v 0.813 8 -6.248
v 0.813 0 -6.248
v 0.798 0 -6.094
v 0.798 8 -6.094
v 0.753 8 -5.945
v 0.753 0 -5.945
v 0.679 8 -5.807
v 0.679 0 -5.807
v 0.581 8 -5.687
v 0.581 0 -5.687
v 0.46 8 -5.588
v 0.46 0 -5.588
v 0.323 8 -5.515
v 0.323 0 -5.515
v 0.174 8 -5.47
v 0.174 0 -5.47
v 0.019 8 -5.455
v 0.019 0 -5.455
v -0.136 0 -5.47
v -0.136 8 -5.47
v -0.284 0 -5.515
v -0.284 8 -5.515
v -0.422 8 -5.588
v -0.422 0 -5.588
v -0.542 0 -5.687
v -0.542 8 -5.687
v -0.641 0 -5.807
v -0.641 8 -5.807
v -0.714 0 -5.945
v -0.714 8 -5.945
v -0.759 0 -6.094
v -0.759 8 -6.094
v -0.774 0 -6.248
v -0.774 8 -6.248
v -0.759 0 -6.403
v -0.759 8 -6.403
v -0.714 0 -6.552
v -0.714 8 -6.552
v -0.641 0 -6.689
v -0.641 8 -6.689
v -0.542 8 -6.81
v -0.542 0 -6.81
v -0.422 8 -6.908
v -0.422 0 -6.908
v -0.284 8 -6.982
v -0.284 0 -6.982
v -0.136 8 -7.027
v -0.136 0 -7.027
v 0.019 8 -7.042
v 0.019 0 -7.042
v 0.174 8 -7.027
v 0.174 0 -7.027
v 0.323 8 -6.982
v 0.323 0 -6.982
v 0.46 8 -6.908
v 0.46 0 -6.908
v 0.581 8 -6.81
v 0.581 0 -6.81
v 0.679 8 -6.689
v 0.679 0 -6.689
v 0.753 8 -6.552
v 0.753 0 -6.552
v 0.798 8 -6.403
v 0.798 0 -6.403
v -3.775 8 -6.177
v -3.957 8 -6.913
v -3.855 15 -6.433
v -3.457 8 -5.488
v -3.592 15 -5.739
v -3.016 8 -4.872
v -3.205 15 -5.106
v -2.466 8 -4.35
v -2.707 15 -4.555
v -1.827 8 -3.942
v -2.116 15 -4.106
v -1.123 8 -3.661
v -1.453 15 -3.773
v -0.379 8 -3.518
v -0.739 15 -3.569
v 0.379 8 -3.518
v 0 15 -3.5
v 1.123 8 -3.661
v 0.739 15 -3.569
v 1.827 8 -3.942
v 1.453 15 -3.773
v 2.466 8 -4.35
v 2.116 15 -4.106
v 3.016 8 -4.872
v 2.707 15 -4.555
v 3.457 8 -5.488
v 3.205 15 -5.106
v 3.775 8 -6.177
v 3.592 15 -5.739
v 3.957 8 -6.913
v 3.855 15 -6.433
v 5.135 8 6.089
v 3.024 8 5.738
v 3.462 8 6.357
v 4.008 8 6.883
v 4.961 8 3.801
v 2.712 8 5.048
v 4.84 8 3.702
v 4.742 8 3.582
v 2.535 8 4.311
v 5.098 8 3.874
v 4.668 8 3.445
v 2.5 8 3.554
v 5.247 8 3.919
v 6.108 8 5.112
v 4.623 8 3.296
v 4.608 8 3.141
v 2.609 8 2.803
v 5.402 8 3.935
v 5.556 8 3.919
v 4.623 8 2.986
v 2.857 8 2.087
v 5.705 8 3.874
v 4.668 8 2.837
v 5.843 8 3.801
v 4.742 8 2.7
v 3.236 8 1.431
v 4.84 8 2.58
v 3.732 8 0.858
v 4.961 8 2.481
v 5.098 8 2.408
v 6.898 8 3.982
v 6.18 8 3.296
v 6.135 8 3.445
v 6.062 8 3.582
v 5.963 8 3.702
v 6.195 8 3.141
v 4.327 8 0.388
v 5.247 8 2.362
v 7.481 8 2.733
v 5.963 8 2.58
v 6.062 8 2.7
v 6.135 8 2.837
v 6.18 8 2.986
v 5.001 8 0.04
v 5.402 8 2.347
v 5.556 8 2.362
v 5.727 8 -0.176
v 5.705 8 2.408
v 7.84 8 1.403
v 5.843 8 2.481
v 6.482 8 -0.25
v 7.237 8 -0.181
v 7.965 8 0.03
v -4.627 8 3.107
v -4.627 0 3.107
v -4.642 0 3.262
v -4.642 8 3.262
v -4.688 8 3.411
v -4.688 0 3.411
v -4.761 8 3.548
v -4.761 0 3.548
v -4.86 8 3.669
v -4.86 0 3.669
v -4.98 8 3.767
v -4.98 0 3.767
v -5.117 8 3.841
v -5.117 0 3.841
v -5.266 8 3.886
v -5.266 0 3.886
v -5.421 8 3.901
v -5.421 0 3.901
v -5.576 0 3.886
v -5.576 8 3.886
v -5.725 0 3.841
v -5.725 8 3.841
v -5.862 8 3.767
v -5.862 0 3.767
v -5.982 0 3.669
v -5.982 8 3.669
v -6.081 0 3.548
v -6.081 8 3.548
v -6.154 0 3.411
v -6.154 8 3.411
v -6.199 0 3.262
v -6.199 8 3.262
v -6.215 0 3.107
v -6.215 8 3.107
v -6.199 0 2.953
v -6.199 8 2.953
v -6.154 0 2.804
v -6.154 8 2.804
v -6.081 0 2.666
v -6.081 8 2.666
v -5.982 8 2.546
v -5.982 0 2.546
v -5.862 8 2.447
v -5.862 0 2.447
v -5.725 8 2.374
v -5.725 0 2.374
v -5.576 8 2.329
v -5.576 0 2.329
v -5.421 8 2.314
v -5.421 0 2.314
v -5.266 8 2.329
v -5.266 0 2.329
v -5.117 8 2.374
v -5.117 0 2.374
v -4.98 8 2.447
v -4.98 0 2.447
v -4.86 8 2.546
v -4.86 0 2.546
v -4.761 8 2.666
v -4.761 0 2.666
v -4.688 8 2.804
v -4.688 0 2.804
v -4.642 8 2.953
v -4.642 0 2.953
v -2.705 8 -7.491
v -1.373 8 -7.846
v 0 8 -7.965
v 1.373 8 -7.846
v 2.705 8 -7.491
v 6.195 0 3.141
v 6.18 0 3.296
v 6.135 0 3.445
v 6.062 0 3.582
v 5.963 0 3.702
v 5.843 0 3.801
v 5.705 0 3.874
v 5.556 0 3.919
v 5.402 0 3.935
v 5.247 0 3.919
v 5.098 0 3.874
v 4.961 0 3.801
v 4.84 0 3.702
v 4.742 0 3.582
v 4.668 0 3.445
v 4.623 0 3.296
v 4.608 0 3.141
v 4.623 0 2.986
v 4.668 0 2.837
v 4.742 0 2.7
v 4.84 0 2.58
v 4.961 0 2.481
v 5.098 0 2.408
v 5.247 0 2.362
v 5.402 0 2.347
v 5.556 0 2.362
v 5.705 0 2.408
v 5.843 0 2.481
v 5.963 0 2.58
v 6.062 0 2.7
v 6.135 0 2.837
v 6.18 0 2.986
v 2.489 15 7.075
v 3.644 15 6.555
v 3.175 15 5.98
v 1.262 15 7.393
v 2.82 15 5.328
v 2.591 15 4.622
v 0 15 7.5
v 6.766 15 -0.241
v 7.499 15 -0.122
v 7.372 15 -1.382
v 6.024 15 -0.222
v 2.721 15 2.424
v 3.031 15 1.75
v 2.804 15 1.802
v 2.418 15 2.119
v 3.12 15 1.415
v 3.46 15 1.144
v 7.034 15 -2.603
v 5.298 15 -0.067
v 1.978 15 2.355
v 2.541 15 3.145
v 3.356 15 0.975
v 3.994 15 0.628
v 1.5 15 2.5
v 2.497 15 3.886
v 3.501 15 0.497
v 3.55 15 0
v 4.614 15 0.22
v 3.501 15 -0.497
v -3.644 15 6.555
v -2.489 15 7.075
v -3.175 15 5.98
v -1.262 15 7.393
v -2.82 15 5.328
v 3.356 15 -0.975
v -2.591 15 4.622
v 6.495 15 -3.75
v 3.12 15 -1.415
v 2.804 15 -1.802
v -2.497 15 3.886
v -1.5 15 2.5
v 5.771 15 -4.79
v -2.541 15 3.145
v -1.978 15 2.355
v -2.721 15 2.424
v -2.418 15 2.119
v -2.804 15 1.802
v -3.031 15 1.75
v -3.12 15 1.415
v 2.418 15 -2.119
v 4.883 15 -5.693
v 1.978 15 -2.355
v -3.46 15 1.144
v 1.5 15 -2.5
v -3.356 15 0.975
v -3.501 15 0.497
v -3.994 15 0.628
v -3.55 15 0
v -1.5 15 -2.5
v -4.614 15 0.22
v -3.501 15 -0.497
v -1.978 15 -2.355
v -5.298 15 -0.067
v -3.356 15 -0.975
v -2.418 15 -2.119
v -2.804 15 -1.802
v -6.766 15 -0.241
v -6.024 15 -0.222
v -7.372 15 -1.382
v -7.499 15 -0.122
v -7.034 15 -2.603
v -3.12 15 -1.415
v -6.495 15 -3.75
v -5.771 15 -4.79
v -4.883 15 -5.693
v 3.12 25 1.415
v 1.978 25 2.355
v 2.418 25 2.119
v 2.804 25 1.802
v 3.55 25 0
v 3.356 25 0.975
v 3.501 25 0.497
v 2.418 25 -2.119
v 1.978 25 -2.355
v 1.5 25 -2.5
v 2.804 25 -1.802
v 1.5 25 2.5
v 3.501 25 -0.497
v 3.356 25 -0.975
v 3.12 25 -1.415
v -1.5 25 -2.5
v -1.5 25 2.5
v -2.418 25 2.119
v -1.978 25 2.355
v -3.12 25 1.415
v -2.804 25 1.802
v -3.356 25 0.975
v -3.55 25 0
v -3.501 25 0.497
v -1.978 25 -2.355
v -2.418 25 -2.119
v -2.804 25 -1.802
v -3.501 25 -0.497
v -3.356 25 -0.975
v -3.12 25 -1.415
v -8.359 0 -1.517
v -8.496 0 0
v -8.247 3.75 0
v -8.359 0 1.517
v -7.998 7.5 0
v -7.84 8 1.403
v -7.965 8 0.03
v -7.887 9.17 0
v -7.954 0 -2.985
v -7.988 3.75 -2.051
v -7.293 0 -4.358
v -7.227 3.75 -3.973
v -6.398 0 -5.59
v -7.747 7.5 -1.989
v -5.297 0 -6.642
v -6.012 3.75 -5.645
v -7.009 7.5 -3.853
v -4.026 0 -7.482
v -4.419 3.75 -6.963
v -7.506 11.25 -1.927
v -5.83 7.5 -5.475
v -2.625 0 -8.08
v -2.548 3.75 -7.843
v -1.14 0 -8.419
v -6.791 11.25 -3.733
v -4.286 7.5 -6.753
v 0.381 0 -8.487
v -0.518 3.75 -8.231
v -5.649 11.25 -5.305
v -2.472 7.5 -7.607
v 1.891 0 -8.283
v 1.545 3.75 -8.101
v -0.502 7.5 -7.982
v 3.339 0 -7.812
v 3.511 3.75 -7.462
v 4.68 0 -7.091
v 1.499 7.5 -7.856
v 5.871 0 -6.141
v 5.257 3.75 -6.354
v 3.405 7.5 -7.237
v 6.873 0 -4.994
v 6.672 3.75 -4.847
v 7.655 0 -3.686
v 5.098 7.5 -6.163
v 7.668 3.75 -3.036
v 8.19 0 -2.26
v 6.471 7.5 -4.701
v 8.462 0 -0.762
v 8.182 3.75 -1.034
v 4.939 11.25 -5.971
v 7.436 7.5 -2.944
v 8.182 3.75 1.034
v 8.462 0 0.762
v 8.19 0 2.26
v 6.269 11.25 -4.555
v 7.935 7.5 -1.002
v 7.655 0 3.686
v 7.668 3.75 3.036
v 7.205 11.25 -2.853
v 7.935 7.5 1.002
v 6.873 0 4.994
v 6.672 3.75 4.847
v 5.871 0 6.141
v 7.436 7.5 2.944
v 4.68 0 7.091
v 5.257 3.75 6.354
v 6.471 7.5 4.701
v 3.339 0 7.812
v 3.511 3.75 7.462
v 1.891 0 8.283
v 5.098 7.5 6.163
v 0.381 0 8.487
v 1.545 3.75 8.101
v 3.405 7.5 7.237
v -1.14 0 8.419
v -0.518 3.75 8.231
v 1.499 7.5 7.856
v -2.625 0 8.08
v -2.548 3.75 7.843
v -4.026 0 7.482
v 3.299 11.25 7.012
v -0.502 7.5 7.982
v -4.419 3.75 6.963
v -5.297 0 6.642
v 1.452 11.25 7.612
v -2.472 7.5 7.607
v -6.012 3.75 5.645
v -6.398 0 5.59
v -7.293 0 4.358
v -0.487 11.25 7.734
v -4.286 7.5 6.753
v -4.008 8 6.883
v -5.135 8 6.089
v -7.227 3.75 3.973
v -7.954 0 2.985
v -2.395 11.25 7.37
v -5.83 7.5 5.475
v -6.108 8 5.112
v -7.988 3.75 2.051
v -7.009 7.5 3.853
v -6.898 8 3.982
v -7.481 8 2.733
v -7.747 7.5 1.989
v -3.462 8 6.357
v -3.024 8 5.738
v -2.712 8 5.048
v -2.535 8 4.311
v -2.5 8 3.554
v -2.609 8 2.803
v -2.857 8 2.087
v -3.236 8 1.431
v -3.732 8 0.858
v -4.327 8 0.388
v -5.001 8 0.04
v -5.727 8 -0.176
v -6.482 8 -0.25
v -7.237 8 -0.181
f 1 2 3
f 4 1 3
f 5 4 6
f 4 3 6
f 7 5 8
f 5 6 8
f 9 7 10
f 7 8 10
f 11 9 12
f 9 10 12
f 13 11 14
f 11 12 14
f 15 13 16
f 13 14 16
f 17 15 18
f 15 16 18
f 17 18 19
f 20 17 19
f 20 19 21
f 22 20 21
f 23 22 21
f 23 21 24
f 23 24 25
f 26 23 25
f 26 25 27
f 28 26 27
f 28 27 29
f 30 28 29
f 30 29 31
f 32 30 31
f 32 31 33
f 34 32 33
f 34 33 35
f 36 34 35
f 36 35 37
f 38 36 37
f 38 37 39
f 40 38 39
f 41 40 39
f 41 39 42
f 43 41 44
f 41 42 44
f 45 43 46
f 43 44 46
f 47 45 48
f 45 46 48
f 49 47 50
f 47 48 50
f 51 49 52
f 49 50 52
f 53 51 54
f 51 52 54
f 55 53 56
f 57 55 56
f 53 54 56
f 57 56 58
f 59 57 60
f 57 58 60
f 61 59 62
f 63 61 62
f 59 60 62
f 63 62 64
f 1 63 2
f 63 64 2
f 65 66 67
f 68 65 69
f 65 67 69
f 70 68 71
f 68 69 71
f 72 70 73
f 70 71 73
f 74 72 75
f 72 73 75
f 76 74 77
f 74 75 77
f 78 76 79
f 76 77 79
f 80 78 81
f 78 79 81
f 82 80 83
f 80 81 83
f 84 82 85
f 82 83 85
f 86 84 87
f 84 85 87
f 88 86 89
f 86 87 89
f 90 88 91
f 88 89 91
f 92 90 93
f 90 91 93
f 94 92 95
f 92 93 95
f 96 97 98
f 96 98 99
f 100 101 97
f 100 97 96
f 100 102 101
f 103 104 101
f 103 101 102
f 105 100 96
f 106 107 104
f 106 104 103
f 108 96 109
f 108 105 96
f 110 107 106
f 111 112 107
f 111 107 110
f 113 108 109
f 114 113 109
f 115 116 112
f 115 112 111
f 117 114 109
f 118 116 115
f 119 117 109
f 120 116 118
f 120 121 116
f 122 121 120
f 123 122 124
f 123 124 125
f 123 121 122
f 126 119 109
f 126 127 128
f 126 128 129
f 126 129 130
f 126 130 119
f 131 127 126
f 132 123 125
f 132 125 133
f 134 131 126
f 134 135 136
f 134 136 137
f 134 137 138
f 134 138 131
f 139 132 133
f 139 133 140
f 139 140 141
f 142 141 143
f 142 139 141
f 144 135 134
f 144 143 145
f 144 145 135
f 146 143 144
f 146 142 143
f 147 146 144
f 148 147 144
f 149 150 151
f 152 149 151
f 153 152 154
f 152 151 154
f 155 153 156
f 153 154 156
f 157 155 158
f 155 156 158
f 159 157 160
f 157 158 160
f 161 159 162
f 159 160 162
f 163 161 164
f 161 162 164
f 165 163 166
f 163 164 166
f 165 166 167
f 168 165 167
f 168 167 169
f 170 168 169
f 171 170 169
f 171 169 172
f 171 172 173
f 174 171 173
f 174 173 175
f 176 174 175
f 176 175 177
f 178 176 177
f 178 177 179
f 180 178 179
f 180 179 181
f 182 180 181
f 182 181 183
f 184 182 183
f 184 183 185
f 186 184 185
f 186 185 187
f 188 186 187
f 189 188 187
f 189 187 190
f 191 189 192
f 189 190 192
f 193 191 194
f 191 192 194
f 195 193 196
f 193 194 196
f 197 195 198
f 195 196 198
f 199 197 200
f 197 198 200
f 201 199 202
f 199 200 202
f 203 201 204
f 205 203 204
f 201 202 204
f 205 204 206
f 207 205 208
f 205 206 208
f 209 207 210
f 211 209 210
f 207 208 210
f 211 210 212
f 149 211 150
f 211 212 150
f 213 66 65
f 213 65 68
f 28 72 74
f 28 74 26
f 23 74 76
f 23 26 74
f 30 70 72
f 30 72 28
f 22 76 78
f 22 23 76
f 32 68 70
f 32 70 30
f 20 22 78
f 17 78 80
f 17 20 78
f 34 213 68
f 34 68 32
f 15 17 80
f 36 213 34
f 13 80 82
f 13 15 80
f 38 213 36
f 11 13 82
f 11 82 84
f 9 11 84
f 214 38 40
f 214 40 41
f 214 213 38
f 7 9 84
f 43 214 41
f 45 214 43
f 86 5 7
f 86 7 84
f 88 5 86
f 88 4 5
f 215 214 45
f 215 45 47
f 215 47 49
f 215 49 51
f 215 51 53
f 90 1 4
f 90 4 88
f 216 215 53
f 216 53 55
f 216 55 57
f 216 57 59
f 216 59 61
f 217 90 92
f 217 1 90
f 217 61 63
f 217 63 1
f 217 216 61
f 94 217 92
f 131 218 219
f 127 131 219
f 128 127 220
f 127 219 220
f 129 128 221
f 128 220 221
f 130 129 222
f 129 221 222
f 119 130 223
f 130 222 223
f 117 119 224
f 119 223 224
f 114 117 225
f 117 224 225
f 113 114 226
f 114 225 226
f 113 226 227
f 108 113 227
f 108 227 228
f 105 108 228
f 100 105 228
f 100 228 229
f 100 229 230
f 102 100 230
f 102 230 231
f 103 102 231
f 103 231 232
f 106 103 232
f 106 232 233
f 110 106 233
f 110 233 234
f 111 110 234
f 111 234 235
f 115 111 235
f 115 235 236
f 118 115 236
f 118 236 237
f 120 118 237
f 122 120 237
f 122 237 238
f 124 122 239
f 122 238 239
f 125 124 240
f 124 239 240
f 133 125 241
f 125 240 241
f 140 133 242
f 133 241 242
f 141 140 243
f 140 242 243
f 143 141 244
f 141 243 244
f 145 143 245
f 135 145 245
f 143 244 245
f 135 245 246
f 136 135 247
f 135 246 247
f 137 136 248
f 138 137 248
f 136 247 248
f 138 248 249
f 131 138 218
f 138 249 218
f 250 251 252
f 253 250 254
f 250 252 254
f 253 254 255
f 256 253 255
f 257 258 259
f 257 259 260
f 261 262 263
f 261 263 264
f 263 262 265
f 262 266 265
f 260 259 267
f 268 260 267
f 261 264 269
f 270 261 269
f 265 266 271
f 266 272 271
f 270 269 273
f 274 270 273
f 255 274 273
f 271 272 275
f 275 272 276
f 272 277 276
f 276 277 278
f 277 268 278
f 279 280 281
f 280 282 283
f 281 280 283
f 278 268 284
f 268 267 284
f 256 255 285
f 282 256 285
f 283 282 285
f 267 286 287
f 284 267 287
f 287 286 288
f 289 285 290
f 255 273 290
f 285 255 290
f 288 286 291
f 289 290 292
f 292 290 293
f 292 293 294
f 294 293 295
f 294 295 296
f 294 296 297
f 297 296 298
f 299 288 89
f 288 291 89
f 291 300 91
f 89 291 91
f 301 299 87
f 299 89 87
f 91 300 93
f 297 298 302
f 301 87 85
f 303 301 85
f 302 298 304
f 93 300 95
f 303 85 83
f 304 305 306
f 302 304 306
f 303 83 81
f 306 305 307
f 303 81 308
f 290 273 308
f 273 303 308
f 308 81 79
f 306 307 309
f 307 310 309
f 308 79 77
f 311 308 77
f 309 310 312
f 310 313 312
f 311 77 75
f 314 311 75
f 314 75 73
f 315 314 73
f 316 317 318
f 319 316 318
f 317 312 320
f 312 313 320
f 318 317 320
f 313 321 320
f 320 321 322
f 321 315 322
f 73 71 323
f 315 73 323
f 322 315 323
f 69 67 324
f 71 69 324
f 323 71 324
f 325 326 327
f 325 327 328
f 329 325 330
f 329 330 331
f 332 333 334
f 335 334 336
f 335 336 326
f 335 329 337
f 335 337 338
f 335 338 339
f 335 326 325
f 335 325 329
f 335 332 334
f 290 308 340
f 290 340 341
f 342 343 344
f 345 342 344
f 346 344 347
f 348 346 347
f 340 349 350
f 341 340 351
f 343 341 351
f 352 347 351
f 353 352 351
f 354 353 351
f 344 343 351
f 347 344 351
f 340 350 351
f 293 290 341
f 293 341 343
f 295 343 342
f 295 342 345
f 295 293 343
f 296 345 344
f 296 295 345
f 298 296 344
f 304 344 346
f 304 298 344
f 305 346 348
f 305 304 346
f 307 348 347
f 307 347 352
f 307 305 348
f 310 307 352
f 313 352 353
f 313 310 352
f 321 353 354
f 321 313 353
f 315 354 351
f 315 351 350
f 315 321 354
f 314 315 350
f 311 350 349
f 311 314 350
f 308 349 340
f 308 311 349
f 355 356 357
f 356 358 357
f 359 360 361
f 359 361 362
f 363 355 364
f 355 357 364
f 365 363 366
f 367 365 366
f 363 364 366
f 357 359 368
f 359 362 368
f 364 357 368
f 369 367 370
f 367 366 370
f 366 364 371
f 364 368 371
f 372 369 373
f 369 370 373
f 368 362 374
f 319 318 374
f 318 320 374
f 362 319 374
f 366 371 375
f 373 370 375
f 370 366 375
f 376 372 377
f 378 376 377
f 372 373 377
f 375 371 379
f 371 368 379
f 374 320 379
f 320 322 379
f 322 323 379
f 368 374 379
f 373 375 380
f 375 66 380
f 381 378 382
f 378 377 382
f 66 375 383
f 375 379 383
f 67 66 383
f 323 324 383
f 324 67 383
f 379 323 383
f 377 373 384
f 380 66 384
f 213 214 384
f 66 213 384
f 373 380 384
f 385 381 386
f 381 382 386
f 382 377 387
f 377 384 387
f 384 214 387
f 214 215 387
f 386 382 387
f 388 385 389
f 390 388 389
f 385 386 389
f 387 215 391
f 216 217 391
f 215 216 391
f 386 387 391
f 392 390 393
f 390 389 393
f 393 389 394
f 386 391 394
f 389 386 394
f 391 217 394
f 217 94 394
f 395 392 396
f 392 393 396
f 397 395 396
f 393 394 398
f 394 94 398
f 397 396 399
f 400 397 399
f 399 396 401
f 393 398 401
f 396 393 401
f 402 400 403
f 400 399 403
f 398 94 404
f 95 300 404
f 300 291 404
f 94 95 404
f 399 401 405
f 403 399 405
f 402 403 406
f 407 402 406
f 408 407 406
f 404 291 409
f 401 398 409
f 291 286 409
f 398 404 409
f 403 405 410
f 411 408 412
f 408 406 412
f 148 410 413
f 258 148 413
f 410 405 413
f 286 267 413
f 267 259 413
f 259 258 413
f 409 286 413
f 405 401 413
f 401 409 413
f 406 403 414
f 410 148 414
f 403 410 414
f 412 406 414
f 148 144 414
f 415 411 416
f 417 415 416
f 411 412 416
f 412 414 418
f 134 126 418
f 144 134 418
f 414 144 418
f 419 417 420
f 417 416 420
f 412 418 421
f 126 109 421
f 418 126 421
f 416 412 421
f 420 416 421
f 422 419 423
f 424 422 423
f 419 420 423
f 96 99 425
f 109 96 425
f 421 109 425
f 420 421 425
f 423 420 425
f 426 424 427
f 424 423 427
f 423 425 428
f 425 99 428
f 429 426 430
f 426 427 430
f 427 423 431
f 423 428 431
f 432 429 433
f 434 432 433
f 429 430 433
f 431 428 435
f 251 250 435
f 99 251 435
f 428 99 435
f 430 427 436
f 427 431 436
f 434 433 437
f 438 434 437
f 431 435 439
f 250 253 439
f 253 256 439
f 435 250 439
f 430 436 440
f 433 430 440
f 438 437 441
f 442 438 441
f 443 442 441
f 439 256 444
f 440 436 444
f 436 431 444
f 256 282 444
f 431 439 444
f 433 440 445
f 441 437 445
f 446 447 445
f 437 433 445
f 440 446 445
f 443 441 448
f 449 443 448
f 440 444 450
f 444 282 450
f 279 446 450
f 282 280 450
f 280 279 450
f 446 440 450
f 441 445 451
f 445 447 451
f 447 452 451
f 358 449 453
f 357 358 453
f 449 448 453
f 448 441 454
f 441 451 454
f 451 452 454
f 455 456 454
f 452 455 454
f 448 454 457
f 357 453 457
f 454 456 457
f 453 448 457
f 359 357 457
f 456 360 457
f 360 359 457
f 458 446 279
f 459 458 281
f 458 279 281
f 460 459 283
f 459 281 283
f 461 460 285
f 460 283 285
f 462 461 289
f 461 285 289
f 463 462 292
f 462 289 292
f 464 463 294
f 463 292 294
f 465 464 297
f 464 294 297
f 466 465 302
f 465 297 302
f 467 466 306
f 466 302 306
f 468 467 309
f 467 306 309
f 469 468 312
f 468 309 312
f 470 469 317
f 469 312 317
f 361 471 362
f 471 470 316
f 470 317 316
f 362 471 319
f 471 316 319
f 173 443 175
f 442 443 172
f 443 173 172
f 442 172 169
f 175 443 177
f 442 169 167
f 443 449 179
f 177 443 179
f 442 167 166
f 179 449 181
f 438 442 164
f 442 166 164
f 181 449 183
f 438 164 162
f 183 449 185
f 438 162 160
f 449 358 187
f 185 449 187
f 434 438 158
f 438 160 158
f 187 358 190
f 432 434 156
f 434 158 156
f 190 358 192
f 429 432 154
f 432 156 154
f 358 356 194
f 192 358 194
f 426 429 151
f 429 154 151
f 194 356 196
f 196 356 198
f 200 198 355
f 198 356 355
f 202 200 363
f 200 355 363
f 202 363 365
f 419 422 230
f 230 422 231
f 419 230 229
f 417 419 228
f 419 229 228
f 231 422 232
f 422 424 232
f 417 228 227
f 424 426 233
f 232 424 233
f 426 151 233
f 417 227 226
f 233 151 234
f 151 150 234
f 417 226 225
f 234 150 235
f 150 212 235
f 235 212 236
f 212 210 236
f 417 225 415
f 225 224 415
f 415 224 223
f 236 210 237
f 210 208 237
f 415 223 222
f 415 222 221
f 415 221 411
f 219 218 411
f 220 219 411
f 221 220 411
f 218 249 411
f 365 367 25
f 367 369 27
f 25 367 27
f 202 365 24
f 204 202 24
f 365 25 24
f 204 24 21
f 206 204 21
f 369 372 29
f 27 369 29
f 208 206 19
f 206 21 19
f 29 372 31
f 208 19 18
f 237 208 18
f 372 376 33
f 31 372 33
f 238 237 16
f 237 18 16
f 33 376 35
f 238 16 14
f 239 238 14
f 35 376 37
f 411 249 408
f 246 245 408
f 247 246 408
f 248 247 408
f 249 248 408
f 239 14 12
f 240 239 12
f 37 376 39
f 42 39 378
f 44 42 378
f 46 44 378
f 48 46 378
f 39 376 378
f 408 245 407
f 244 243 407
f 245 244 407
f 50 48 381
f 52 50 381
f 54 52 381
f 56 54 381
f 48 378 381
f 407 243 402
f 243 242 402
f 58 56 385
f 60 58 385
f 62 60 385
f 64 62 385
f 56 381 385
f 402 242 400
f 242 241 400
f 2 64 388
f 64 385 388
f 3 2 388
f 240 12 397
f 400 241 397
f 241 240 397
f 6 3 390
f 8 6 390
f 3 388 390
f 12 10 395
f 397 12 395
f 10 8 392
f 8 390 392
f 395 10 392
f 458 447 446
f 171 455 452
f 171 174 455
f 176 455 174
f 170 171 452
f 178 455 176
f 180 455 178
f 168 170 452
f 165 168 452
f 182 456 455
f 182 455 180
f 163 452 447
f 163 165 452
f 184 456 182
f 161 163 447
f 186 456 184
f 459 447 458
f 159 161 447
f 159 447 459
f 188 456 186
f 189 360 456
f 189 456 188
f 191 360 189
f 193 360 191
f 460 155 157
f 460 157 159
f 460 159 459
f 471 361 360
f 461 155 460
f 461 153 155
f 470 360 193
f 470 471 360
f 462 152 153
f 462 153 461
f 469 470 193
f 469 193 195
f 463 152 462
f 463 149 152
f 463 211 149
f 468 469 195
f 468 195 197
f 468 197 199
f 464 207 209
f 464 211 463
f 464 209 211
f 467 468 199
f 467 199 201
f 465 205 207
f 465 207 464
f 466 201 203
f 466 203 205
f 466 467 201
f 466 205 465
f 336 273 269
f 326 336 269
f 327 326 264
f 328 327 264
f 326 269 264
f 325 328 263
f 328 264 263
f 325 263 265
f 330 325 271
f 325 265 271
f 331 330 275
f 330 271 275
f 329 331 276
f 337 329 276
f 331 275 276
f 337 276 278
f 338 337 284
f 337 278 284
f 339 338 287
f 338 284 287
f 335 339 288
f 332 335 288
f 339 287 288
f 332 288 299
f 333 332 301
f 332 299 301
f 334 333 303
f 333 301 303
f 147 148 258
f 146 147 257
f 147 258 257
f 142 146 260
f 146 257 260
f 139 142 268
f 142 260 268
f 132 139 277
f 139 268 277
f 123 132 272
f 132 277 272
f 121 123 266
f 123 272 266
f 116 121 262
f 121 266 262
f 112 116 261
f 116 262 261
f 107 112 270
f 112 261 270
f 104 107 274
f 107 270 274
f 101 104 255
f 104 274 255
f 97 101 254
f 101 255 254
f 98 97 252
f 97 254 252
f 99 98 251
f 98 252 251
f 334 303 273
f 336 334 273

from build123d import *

# Parameters (mm, degrees)
CUT_EXTRUDE4_REACH  = 21.219
SKETCH5_R           = 0.79375
SKETCH4_R           = 4
CUT_EXTRUDE3_DEPTH  = 7
BOSS_EXTRUDE1_DEPTH = 10


with BuildPart() as part:
    # Sketch1 → Revolve1 (revolve)
    with BuildSketch(Plane.XY, mode=Mode.PRIVATE) as revolve1_sk:
        Polygon((0, 0), (8.496, 0), (7.5, 15), (3.5, 15), (0, 15), align=None)
    revolve(revolve1_sk.sketch.rotate(Axis((0, 15, 0), (0, -1, 0)), 180), axis=Axis((0, 15, 0), (0, -1, 0)))

    # Sketch5 → Cut-Extrude4 (cut, up to next)
    with BuildSketch(Plane.XZ, mode=Mode.PRIVATE) as cut_extrude4_sk1:
        with Locations((5.401571729, 3.140943396)):
            Circle(SKETCH5_R)
    cut_extrude4_tool1 = extrude(cut_extrude4_sk1.sketch, amount=-CUT_EXTRUDE4_REACH, mode=Mode.PRIVATE) & part.part
    # Sketch5 → Cut-Extrude4 (cut, up to next)
    with BuildSketch(Plane.XZ, mode=Mode.PRIVATE) as cut_extrude4_sk2:
        with Locations((0.019350908, -6.248370036)):
            Circle(SKETCH5_R)
    cut_extrude4_tool2 = extrude(cut_extrude4_sk2.sketch, amount=-CUT_EXTRUDE4_REACH, mode=Mode.PRIVATE) & part.part
    # Sketch5 → Cut-Extrude4 (cut, up to next)
    with BuildSketch(Plane.XZ, mode=Mode.PRIVATE) as cut_extrude4_sk3:
        with Locations((-5.420922637, 3.10742664)):
            Circle(SKETCH5_R)
    cut_extrude4_tool3 = extrude(cut_extrude4_sk3.sketch, amount=-CUT_EXTRUDE4_REACH, mode=Mode.PRIVATE) & part.part
    add(cut_extrude4_tool1.solids().sort_by_distance((5.401572, 0, 3.140943))[0], mode=Mode.SUBTRACT)
    add(cut_extrude4_tool2.solids().sort_by_distance((0.019351, 0, -6.24837))[0], mode=Mode.SUBTRACT)
    add(cut_extrude4_tool3.solids().sort_by_distance((-5.420923, 0, 3.107427))[0], mode=Mode.SUBTRACT)

    # Sketch4 → Cut-Extrude3 (cut)
    with BuildSketch(Plane(origin=(0, 15, 0), x_dir=(1, 0, 0), z_dir=(0, 1, 0))):
        with Locations((0, 7.5)):
            Circle(SKETCH4_R)
        with Locations((6.495190528, -3.75)):
            Circle(SKETCH4_R)
        with Locations((-6.495190528, -3.75)):
            Circle(SKETCH4_R)
    extrude(amount=-CUT_EXTRUDE3_DEPTH, mode=Mode.SUBTRACT)

    # Sketch8 → Boss-Extrude1 (add)
    with BuildSketch(Plane(origin=(0, 15, 0), x_dir=(1, 0, 0), z_dir=(0, 1, 0))):
        with BuildLine():
            Line((1.5, 2.5), (1.5, -2.5))
            ThreePointArc((1.5, -2.5), (3.549509757, 0), (1.5, 2.5))
        make_face()
        with BuildLine():
            Line((-1.5, 2.5), (-1.5, -2.5))
            ThreePointArc((-1.5, -2.5), (-3.549509757, 0), (-1.5, 2.5))
        make_face()
    extrude(amount=BOSS_EXTRUDE1_DEPTH)


solid = part.part
